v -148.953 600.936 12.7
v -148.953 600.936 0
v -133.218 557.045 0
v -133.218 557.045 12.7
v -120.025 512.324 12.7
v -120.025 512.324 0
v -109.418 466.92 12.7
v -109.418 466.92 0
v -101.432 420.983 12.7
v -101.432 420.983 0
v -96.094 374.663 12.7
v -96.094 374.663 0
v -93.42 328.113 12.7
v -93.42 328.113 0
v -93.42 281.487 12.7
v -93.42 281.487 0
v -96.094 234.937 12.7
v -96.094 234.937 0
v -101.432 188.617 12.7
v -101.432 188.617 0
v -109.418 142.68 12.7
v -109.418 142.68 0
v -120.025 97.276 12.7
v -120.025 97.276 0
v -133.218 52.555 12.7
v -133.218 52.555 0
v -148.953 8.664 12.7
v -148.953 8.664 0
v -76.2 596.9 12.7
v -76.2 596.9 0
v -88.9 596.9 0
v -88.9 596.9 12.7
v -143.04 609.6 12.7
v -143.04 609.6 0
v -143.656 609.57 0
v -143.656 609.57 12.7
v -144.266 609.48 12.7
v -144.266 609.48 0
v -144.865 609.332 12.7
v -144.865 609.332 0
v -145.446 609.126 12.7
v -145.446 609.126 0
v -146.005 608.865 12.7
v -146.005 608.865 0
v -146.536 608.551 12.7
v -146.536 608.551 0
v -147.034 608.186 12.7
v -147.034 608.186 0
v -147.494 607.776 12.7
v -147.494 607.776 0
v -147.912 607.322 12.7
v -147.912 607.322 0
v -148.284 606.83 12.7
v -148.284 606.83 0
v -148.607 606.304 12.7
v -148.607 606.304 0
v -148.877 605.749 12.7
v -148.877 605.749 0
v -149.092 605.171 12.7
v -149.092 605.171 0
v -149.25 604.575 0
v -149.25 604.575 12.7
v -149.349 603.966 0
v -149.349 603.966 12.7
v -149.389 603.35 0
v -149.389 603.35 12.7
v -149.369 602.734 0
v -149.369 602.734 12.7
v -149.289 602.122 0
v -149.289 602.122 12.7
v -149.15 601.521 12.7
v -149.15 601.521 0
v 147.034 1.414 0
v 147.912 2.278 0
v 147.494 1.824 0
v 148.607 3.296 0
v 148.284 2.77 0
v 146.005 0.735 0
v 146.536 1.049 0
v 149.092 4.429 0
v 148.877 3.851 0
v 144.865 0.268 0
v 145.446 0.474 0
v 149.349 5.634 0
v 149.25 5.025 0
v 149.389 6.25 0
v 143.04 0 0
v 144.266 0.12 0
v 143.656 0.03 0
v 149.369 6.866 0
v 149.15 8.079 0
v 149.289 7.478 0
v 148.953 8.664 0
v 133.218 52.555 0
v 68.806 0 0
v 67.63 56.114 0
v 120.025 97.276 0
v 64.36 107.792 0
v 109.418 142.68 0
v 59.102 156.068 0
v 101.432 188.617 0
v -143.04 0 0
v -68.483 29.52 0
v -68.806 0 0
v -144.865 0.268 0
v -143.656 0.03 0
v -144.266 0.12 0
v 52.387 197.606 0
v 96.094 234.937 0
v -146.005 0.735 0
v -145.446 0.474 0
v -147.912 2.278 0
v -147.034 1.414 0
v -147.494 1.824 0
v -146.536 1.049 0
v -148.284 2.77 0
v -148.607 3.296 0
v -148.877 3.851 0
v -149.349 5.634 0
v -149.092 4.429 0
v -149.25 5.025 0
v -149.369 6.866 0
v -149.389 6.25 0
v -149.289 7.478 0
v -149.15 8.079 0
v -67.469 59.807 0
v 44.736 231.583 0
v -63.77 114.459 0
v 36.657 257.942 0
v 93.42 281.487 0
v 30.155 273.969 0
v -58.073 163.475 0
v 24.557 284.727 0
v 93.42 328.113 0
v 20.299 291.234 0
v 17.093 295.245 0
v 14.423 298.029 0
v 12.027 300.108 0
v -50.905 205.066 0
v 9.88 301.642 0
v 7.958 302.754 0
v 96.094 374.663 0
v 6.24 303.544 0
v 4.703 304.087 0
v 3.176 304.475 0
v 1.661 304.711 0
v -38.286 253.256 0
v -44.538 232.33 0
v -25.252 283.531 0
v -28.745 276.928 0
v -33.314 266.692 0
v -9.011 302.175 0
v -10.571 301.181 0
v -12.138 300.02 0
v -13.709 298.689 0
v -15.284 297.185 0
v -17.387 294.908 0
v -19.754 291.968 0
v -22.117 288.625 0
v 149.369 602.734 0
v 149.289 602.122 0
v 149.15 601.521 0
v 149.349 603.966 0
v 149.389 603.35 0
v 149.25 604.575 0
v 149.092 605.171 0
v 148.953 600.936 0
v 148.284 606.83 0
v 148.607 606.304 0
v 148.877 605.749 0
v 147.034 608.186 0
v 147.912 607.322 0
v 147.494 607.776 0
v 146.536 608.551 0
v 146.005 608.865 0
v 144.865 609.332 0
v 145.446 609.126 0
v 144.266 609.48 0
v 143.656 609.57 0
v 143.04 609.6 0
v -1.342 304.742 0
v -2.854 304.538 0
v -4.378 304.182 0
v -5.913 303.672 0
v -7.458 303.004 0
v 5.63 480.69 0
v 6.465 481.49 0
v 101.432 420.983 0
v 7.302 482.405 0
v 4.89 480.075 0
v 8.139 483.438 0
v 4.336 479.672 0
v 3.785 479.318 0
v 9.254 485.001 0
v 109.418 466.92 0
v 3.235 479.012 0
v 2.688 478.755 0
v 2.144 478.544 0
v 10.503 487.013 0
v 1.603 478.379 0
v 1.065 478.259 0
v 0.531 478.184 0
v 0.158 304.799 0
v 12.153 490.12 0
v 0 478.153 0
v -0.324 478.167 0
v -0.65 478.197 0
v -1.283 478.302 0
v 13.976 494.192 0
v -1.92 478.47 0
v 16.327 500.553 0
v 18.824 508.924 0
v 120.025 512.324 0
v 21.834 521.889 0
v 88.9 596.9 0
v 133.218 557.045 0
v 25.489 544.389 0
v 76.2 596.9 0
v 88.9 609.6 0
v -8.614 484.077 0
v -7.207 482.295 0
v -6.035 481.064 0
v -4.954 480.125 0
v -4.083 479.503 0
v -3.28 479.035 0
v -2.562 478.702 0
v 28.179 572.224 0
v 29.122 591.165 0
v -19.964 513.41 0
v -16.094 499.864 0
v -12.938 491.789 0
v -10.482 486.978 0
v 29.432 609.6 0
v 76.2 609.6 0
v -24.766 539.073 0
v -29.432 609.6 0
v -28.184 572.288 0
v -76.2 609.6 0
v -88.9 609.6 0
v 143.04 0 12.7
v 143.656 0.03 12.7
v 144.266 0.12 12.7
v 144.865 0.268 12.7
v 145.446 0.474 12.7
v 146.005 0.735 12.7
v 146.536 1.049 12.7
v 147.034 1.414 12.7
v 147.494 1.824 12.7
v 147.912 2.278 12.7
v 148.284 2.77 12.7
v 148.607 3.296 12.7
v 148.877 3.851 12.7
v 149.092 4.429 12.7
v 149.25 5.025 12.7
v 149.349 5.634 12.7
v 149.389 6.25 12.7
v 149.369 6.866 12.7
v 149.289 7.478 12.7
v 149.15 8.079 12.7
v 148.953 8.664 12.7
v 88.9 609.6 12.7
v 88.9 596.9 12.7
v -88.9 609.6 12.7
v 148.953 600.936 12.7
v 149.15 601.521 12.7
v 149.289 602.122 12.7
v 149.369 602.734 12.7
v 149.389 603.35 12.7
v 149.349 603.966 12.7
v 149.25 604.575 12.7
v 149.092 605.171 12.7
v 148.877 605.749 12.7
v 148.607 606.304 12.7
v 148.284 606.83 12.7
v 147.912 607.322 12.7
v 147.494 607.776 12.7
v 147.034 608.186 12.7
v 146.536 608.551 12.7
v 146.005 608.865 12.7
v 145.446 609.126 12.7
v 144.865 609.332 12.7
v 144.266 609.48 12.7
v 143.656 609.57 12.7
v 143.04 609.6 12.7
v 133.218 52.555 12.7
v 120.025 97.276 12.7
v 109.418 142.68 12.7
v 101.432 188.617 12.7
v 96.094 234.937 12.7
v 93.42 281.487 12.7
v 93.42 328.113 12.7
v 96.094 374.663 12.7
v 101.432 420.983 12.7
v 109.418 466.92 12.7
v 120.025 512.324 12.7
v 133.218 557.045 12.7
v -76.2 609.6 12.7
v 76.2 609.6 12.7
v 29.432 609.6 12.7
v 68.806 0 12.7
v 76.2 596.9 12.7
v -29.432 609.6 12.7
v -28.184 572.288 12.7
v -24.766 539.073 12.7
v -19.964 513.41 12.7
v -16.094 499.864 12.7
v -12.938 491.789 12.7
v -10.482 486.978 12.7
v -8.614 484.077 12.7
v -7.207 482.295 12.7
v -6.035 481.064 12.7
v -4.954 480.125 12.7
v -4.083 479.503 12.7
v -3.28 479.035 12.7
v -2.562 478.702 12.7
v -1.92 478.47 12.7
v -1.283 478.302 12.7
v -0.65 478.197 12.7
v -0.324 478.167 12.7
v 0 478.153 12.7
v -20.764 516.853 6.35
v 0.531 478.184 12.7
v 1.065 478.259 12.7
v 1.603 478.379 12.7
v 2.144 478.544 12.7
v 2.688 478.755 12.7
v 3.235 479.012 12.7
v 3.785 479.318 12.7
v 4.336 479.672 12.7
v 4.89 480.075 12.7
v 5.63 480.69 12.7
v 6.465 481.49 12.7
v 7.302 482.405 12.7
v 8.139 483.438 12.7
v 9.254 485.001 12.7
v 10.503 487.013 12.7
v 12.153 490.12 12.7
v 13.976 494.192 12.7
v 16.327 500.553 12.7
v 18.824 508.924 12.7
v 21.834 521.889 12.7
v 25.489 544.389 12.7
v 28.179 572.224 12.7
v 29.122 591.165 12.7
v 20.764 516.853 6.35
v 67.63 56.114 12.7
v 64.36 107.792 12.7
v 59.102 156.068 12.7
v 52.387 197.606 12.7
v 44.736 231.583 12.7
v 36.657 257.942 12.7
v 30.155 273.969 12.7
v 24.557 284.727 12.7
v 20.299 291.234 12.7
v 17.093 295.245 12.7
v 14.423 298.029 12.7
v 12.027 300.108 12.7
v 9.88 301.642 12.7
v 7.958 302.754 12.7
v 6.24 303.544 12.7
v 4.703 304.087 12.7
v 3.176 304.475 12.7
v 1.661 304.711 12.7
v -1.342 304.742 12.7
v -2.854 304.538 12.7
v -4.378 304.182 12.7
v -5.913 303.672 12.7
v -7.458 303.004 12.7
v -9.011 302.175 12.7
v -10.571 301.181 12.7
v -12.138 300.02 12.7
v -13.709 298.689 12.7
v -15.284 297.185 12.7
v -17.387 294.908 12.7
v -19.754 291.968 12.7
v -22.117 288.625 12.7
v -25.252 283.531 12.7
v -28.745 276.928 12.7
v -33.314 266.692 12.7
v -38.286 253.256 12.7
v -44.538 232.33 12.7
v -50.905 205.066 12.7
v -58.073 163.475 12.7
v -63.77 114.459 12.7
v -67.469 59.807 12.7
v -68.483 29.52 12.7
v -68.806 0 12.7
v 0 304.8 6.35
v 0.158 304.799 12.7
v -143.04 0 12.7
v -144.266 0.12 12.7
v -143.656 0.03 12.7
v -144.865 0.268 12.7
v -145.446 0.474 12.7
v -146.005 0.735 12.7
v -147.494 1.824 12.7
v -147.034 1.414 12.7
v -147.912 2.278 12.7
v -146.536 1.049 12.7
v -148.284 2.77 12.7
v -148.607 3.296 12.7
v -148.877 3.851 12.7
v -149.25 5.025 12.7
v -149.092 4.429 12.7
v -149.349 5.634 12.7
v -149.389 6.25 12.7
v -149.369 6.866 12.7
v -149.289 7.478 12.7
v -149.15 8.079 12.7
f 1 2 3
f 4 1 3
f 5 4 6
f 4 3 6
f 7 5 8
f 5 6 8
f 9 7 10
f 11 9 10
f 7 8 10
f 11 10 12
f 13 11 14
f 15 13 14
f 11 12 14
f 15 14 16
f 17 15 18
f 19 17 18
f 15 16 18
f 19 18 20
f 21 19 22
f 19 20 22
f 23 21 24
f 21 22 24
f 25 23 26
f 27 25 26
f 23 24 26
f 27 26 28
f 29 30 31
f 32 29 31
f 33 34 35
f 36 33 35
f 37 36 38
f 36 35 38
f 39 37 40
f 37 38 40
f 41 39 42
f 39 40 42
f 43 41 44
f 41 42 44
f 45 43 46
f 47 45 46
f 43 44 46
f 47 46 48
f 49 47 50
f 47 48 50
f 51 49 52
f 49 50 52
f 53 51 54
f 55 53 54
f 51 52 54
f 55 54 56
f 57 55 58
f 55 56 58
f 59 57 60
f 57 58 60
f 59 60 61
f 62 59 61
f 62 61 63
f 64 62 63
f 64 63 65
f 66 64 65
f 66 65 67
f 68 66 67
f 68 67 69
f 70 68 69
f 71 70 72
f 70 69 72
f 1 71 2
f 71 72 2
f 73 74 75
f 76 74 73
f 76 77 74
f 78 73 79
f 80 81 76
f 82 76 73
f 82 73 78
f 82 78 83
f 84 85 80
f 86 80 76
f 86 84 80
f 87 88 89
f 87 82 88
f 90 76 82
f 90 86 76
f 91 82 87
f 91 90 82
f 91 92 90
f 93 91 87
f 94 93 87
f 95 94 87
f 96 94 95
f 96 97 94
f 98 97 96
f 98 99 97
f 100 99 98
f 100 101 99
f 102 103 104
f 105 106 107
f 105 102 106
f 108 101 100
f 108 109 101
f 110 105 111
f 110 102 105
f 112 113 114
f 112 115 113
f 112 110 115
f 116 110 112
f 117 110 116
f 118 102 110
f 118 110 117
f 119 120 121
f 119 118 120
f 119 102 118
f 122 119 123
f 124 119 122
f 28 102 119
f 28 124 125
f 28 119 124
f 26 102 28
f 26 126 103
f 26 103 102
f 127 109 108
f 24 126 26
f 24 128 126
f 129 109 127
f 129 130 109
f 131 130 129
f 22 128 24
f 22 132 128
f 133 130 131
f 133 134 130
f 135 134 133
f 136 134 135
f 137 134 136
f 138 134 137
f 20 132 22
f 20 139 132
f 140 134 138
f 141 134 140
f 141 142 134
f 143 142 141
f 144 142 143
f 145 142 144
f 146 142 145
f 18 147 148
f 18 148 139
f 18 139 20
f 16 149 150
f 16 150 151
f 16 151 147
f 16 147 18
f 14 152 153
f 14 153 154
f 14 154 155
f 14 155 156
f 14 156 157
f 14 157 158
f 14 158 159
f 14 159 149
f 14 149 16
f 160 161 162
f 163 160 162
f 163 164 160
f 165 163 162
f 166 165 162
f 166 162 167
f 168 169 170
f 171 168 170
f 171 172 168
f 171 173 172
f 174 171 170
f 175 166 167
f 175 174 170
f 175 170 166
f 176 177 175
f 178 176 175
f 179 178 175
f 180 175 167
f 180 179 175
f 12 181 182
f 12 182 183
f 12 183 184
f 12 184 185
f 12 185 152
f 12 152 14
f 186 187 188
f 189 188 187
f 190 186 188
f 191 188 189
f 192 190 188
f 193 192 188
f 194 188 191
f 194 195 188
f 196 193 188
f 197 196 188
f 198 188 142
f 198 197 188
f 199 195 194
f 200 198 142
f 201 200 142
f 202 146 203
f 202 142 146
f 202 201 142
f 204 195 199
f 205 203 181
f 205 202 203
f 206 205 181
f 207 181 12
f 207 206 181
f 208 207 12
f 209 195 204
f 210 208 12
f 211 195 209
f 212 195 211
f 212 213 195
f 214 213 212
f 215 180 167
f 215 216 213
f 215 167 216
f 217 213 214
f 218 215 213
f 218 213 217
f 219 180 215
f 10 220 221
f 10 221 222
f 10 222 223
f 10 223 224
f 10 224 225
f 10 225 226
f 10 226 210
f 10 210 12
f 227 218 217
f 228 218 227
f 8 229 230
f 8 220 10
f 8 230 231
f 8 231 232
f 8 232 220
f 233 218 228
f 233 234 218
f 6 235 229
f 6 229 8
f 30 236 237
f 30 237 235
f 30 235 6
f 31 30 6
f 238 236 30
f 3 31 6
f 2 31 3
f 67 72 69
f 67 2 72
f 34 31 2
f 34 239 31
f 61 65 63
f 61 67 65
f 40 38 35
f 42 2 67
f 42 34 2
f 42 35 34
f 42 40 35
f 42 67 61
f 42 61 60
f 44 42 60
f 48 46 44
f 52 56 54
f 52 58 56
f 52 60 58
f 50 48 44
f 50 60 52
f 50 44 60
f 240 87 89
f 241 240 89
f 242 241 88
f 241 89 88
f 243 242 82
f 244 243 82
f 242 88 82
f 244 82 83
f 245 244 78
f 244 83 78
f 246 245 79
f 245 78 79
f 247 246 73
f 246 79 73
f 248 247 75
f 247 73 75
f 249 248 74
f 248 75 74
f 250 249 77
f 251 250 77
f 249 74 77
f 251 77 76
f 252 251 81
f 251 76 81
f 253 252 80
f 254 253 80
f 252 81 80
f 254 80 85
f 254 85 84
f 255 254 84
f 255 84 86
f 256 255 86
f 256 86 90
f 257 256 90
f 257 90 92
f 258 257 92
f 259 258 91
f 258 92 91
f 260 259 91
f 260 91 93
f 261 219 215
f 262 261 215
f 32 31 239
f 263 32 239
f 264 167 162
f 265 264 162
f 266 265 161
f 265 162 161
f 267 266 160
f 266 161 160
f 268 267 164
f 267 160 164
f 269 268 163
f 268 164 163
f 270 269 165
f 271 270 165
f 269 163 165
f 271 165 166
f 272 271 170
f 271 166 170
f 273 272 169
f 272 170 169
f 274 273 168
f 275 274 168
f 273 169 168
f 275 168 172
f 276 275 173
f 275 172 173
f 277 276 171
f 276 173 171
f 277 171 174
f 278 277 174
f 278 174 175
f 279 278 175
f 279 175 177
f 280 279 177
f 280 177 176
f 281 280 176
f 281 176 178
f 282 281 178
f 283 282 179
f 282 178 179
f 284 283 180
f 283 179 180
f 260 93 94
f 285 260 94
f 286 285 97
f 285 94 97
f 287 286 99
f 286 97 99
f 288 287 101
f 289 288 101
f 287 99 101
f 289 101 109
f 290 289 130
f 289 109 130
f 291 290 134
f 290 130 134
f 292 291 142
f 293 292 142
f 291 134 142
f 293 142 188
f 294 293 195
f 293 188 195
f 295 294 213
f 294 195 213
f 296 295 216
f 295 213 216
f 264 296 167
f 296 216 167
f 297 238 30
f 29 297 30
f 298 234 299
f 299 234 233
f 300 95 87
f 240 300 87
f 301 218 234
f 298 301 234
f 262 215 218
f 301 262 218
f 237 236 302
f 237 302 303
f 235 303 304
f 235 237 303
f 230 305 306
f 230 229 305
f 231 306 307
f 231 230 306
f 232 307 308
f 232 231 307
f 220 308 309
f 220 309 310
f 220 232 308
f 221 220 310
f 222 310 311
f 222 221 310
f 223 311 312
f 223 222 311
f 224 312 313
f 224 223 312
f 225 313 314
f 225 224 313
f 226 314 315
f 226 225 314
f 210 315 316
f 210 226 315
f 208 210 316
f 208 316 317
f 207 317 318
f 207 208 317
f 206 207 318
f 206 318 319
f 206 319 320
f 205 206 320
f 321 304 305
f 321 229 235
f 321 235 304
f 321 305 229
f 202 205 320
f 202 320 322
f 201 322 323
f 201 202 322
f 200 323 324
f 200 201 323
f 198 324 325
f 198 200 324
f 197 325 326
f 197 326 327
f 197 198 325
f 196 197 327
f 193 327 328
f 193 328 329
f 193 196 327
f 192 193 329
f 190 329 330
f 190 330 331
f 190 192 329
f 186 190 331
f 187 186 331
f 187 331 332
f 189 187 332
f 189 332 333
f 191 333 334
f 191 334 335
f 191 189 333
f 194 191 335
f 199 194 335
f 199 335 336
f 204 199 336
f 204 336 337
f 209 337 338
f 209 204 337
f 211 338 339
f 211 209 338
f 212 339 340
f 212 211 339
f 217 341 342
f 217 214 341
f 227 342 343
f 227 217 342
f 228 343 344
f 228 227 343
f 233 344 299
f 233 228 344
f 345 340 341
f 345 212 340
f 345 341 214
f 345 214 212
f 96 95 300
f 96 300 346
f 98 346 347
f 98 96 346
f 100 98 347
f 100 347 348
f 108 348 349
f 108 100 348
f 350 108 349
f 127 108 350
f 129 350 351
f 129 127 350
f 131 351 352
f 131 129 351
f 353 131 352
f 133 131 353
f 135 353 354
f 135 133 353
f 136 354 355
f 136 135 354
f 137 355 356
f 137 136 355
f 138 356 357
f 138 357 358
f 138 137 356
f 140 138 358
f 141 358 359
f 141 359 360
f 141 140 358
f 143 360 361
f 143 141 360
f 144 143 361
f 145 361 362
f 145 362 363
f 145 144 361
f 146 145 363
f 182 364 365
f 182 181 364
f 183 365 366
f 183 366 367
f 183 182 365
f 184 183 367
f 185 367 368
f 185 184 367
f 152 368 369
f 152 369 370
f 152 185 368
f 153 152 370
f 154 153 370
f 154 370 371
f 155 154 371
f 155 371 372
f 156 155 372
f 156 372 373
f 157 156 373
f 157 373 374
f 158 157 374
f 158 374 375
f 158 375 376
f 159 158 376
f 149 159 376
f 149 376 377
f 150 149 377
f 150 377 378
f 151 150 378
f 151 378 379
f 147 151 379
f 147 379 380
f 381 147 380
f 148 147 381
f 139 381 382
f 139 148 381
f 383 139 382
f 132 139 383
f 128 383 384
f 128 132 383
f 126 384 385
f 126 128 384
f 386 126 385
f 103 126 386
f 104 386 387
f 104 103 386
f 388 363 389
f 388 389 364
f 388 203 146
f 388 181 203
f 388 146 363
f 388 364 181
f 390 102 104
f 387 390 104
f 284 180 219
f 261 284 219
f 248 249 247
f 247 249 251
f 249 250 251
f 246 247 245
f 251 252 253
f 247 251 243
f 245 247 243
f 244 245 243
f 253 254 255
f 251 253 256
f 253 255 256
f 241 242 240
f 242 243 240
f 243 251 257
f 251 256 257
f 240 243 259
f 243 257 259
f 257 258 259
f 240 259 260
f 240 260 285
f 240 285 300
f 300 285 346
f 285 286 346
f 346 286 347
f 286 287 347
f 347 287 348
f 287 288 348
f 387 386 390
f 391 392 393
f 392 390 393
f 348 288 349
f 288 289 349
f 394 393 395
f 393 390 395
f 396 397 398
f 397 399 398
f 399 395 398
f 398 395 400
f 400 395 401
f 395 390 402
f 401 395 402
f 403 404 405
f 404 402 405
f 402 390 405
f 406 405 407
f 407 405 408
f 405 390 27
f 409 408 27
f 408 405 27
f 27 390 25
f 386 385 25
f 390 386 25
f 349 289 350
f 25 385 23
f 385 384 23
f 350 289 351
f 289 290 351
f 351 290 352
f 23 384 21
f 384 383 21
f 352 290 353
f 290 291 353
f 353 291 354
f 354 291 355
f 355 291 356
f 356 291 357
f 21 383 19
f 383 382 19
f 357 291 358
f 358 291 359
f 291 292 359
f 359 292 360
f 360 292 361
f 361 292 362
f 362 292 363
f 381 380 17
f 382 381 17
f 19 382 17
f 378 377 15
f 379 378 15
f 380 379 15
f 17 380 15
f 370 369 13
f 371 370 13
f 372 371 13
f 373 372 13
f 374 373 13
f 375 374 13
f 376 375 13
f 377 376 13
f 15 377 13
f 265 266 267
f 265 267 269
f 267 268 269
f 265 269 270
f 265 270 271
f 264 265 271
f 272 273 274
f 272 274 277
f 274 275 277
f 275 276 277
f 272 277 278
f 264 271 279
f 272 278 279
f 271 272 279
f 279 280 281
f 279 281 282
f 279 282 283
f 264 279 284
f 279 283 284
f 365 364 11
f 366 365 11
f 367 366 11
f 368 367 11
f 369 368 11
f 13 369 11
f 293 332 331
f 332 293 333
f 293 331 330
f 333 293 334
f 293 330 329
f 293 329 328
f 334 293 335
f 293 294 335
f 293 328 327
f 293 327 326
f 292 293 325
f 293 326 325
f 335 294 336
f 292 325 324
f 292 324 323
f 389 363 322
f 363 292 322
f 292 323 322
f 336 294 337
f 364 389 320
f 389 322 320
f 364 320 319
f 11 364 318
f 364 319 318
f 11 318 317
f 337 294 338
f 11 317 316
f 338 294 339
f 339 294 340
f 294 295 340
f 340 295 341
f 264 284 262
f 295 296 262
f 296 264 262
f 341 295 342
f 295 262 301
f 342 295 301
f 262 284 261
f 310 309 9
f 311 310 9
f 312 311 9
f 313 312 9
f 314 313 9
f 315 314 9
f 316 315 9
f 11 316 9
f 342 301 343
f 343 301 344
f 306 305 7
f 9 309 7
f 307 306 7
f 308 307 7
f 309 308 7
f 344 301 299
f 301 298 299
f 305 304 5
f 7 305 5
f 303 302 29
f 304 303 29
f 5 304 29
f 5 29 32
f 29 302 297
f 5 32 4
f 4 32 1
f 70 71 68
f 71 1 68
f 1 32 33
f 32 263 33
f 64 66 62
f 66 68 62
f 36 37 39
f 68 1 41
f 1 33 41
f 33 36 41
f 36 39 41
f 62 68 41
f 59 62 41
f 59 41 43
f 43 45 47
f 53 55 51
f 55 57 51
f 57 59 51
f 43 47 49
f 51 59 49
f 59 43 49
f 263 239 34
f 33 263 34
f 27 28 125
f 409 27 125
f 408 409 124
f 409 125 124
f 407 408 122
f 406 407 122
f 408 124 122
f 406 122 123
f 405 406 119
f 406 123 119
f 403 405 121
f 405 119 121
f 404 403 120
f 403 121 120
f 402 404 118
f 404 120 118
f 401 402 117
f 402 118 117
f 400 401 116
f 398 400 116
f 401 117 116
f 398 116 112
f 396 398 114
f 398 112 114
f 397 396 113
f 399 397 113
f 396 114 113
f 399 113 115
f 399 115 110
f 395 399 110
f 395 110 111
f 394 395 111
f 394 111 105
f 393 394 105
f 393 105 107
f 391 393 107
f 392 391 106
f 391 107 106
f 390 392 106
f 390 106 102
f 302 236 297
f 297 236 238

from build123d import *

# Parameters (mm, degrees)
F1_DEPTH = 12.7


with BuildPart() as f1:
    # F0 (on Top) → F1 (new body)
    with BuildSketch(Plane.XY):
        with BuildLine():
            add(Edge.make_bspline(
                [(68.8061999409, 0), (68.8061999409, 304.8), (0, 304.8)],
                knots=[4.7123889804, 4.7123889804, 4.7123889804, 6.2831853072, 6.2831853072, 6.2831853072], degree=2, weights=[1, 0.7071067812, 1]))
            Line((68.8061999409, 0), (143.0395694707, 0))
            ThreePointArc((143.0395694707, 0), (148.2842640953, 2.7701007983), (148.9531058802, 8.6635658915))
            ThreePointArc((148.9531058802, 8.6635658915), (93.0857662889, 304.8), (148.9531058802, 600.9364341085))
            ThreePointArc((148.9531058802, 600.9364341085), (148.2842640953, 606.8298992017), (143.0395694707, 609.6))
            Line((143.0395694707, 609.6), (88.9, 609.6))
            Line((88.9, 609.6), (88.9, 596.9))
            Line((88.9, 596.9), (76.2, 596.9))
            Line((76.2, 596.9), (76.2, 609.6))
            Line((76.2, 609.6), (29.4321160355, 609.6))
            add(Edge.make_bspline(
                [(0, 478.1525495466), (29.2977038939, 478.7228997007), (29.4321160355, 609.6)],
                knots=[3.1461804743, 3.1461804743, 3.1461804743, 4.7123889804, 4.7123889804, 4.7123889804], degree=2, weights=[1, 0.7087269589, 1]))
            add(Edge.make_bspline(
                [(-29.4321160355, 609.6), (-29.2977038939, 478.7228997007), (0, 478.1525495466)],
                knots=[4.7123889804, 4.7123889804, 4.7123889804, 6.2785974865, 6.2785974865, 6.2785974865], degree=2, weights=[1, 0.7087269589, 1]))
            Line((-29.4321160355, 609.6), (-76.2, 609.6))
            Line((-76.2, 609.6), (-76.2, 596.9))
            Line((-76.2, 596.9), (-88.9, 596.9))
            Line((-88.9, 596.9), (-88.9, 609.6))
            Line((-88.9, 609.6), (-143.0395694707, 609.6))
            ThreePointArc((-143.0395694707, 609.6), (-148.2842640953, 606.8298992017), (-148.9531058802, 600.9364341085))
            ThreePointArc((-148.9531058802, 600.9364341085), (-93.0857662889, 304.8), (-148.9531058802, 8.6635658915))
            ThreePointArc((-148.9531058802, 8.6635658915), (-148.2842640953, 2.7701007983), (-143.0395694707, 0))
            Line((-143.0395694707, 0), (-68.8061999409, 0))
            add(Edge.make_bspline(
                [(0, 304.8), (-68.8061999409, 304.8), (-68.8061999409, 0)],
                knots=[0, 0, 0, 1.5707963268, 1.5707963268, 1.5707963268], degree=2, weights=[1, 0.7071067812, 1]))
        make_face()
    extrude(amount=F1_DEPTH)


solid = f1.part
